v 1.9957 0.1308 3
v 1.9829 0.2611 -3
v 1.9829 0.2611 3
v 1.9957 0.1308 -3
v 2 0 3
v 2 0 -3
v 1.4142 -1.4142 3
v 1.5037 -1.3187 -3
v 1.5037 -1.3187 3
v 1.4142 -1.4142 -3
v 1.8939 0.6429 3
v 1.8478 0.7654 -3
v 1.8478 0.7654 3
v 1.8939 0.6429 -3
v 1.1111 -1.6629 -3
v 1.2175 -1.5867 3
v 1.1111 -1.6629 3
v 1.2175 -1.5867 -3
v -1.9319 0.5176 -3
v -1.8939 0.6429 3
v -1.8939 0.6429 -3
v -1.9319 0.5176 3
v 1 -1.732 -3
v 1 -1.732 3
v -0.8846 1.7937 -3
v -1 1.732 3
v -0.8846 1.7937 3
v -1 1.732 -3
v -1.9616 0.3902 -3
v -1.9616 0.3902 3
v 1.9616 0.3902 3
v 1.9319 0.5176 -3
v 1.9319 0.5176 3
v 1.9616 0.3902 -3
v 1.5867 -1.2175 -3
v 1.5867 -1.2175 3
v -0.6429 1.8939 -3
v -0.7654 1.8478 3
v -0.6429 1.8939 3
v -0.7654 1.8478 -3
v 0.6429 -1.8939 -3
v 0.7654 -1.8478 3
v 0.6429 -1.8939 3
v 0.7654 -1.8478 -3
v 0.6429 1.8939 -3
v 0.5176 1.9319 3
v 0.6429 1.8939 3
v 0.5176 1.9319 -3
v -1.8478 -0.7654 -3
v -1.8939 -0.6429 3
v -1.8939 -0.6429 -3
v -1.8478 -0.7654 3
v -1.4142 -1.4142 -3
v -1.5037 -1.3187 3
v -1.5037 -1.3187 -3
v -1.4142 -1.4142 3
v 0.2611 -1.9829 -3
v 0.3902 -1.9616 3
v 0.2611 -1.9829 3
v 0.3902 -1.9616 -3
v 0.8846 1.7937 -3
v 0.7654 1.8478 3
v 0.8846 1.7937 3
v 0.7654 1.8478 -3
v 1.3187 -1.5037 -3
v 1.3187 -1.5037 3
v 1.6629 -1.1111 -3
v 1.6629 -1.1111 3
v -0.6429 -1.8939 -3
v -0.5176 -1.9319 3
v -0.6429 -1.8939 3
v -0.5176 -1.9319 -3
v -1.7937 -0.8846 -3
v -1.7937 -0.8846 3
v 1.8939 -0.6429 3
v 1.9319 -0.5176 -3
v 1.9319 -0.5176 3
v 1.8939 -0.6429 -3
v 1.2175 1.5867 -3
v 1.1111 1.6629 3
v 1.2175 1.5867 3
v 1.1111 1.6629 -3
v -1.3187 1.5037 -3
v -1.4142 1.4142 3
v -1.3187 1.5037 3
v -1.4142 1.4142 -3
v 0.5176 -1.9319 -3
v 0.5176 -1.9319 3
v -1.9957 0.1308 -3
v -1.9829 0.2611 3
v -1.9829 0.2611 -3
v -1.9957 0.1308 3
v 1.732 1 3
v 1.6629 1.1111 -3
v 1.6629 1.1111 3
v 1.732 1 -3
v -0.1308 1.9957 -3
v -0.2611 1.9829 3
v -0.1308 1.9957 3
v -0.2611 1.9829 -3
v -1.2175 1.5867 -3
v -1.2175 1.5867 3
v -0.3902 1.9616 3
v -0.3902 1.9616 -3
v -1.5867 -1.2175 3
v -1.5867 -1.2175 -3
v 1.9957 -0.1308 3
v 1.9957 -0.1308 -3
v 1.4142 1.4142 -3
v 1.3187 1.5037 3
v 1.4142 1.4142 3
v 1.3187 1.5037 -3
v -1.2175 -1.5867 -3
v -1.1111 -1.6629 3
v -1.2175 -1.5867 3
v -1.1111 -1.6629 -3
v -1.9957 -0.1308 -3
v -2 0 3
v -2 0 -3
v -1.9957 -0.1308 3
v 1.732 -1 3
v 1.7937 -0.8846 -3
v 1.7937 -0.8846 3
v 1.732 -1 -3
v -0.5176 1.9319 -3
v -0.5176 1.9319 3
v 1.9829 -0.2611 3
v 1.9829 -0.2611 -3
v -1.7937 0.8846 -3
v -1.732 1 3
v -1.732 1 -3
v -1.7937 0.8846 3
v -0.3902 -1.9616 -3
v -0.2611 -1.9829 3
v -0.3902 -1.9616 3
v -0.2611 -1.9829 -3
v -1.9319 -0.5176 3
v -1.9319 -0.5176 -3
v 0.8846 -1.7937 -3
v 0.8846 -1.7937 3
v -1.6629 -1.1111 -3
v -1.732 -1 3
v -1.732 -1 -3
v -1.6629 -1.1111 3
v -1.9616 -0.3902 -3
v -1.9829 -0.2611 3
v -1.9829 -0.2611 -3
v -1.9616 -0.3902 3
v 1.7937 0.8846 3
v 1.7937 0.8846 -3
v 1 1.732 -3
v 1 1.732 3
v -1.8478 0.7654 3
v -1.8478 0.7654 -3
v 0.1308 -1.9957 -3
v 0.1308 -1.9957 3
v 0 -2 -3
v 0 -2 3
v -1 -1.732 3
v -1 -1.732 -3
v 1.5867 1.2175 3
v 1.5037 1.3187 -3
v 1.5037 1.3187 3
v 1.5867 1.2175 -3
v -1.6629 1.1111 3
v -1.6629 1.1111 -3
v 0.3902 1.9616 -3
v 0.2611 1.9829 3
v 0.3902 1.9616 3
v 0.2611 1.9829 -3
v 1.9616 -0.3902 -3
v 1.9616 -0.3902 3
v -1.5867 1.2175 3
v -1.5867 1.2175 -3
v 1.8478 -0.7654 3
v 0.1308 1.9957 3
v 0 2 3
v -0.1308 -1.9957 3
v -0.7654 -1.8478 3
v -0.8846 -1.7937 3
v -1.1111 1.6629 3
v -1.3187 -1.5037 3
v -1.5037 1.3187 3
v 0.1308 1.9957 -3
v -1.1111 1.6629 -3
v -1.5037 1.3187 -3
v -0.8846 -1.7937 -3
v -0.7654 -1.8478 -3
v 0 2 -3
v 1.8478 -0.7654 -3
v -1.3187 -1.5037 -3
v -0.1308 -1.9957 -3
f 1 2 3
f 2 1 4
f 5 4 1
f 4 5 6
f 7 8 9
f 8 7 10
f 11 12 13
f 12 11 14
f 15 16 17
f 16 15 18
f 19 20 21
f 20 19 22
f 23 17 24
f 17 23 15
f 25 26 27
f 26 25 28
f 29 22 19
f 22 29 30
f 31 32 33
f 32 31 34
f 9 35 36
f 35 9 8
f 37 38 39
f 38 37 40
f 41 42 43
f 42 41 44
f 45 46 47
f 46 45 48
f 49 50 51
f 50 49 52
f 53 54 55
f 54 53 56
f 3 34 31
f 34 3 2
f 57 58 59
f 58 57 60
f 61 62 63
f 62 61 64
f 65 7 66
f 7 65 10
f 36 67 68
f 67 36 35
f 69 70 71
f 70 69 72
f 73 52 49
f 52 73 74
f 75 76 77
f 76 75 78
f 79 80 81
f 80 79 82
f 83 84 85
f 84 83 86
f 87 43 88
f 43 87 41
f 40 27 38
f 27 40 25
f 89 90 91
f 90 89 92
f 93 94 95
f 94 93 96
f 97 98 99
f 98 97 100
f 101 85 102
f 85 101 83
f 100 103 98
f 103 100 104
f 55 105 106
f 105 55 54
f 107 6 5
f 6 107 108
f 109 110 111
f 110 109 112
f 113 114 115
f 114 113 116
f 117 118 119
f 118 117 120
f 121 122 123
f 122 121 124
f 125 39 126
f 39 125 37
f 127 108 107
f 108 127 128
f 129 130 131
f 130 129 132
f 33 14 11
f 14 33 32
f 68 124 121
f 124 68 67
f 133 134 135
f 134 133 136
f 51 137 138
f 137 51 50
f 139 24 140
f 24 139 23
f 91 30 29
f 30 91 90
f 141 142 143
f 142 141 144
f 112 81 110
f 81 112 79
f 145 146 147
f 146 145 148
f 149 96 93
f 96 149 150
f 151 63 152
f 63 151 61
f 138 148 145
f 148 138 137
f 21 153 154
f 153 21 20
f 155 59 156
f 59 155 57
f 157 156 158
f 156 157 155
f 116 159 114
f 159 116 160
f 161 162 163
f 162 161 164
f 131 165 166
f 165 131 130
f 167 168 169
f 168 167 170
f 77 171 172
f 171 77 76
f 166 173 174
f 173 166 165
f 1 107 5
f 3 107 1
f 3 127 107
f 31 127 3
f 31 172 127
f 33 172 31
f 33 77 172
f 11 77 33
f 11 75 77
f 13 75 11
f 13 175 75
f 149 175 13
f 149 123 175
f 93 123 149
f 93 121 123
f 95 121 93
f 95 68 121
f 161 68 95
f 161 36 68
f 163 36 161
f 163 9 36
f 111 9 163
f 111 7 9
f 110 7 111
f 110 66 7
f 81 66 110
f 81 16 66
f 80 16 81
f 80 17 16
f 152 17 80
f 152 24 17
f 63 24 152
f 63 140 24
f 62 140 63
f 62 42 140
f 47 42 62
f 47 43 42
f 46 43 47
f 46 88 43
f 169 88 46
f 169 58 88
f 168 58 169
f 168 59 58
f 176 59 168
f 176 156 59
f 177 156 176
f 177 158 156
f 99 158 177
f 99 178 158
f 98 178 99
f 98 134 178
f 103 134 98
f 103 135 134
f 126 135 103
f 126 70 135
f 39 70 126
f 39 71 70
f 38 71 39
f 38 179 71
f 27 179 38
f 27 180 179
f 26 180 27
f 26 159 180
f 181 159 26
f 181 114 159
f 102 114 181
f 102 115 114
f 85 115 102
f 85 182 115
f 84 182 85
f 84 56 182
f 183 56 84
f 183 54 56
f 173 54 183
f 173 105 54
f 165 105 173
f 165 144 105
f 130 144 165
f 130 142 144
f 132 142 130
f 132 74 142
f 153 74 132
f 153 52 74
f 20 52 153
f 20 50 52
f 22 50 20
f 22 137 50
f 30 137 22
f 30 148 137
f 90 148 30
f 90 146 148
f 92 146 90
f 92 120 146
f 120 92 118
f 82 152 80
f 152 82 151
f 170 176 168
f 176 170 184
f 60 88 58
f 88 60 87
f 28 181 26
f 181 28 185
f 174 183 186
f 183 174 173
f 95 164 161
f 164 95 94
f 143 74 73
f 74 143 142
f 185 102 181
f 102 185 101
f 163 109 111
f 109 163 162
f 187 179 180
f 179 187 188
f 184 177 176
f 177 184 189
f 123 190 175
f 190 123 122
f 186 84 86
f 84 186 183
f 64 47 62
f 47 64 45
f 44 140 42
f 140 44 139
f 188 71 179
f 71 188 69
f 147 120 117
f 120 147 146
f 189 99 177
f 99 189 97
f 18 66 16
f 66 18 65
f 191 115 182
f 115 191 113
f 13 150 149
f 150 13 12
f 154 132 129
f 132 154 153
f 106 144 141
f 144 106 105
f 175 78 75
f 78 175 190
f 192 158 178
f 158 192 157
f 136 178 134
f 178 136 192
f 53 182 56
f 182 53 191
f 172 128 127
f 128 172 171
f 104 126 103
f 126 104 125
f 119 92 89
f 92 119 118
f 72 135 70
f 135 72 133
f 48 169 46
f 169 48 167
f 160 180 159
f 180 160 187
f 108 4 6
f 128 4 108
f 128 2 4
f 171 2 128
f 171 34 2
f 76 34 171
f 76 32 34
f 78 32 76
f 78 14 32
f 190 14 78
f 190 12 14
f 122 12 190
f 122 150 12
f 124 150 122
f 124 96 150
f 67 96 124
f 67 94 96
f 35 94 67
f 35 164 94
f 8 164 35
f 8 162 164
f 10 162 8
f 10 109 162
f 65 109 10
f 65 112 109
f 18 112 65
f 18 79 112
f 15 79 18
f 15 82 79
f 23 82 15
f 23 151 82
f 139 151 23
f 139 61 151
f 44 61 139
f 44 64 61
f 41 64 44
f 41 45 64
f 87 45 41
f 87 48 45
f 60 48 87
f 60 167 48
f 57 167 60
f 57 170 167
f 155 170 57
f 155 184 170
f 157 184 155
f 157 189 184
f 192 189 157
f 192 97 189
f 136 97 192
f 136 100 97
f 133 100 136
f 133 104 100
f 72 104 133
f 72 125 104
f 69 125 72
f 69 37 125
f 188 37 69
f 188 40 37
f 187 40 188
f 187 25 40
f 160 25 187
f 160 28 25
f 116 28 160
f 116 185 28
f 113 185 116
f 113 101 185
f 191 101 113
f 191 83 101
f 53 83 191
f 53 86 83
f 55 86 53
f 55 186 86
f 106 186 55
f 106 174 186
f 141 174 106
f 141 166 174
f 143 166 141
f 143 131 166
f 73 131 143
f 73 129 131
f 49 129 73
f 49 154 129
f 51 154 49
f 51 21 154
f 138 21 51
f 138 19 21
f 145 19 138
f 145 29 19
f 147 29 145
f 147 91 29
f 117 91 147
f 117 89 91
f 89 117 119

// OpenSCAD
$fn=96;

module hex_socket(h=2.2, af=2.0){
    r = af/(2*cos(30));
    cylinder(h=h, r=r, $fn=6);
}

module grub_screw_M4(L=6, d=4, pitch=0.7, socket_depth=2.2, socket_af=2.0){
    union(){
        difference(){
            cylinder(h=L, d=d);
            translate([0,0,L-socket_depth])
                hex_socket(h=socket_depth+0.2, af=socket_af);
        }
        translate([0,0,0])
            cylinder(h=0.8, d1=d*0.95, d2=0.6);
        translate([0,0,0.8])
            cylinder(h=L-0.8, d=d*0.98);
    }
}

translate([0,0,-3])
    grub_screw_M4(L=6);
